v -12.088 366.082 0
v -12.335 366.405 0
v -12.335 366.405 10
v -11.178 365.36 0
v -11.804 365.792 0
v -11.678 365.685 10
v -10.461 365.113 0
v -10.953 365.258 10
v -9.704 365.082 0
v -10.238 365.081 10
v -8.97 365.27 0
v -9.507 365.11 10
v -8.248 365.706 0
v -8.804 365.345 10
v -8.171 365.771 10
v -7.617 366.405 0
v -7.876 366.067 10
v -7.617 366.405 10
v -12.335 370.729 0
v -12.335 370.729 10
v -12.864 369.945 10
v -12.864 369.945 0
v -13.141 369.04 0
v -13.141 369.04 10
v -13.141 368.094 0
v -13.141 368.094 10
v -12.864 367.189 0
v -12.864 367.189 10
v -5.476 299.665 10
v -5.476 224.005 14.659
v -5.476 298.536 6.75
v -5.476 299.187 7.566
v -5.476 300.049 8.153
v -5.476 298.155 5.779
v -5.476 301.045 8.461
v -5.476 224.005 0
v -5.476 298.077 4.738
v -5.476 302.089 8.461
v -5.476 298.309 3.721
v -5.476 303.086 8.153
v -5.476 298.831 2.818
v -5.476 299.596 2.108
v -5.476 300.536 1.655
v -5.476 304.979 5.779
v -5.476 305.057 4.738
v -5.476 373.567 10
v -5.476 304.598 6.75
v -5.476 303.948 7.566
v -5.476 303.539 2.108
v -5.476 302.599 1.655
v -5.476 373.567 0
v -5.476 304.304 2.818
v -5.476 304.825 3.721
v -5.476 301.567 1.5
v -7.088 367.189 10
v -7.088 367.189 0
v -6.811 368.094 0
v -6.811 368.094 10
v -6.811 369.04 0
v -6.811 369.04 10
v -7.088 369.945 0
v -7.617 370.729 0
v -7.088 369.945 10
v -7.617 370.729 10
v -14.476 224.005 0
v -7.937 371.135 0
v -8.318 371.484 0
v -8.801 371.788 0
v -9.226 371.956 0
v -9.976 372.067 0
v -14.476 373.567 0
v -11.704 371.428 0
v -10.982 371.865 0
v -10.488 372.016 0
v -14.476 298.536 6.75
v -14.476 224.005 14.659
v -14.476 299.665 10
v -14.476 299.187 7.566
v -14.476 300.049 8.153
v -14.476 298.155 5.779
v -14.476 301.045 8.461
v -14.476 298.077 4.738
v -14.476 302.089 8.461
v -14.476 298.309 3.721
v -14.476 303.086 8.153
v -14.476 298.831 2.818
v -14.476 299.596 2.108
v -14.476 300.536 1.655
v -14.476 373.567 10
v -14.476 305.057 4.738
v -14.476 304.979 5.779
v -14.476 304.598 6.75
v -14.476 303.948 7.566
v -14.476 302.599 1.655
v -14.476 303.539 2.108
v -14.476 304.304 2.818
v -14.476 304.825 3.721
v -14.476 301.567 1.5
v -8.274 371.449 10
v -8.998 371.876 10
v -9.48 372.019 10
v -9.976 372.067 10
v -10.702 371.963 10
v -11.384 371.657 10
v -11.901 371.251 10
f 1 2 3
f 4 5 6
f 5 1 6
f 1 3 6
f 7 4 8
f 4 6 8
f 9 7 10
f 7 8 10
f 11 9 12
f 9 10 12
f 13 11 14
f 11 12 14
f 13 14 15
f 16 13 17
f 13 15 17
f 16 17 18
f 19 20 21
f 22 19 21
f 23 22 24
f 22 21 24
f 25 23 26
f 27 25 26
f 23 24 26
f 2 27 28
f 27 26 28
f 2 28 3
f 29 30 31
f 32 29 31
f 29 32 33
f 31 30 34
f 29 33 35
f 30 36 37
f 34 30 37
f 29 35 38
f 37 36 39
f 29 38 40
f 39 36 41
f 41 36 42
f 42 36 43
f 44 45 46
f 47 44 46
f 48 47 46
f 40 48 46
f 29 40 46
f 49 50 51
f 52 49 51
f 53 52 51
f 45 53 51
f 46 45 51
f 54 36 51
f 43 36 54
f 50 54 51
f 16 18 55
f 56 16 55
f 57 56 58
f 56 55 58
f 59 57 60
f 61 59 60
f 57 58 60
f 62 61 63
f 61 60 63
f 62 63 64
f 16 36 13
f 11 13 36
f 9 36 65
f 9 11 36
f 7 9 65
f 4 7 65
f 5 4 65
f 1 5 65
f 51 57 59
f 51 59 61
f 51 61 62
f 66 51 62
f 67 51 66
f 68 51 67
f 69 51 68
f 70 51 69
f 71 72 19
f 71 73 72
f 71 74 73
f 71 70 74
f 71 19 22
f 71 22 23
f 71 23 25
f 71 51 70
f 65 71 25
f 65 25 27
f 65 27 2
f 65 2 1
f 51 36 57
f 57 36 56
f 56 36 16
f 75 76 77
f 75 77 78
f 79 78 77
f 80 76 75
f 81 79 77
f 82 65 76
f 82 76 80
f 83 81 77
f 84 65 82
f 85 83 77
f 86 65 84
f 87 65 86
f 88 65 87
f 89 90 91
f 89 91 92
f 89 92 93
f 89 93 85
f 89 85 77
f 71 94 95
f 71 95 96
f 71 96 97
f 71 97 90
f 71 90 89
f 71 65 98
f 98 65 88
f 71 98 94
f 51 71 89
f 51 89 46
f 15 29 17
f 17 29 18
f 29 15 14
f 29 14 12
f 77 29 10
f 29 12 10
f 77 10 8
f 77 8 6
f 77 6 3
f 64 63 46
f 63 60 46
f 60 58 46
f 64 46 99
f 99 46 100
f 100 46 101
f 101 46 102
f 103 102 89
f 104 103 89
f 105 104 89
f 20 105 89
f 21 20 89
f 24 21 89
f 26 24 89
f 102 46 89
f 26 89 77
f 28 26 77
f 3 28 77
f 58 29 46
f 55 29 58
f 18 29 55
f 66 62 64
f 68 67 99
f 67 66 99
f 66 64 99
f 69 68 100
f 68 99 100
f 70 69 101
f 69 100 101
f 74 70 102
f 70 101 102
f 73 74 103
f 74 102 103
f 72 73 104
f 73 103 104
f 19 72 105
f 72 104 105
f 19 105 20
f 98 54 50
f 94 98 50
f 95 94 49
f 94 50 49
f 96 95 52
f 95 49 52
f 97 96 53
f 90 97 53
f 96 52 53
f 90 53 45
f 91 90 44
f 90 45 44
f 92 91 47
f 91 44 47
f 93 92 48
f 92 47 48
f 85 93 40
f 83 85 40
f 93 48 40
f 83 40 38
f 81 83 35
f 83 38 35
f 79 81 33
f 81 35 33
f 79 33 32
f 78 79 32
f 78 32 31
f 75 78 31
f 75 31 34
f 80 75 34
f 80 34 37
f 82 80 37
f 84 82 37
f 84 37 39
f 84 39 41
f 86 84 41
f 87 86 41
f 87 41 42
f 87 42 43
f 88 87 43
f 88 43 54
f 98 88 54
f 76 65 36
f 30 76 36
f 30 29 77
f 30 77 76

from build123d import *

# Parameters (mm, degrees)
BOSS_EXTRU_1_DEPTH      = 10
ESQUISSE3_W             = 9
ESQUISSE3_H             = 75.66
BOSS_EXTRU_2_DEPTH      = 7
ENL_V_MAT_EXTRU_1_DEPTH = 13
ESQUISSE5_RX            = 3.5
ESQUISSE5_RY            = 3
ENL_V_MAT_EXTRU_2_DEPTH = 13
ESQUISSE6_R             = 3.2
ENL_V_MAT_EXTRU_3_DEPTH = 13
ESQUISSE7_R             = 3.5
ENL_V_MAT_EXTRU_4_DEPTH = 13


with BuildPart() as part:
    # Esquisse2 → Boss.-Extru.1 (new body)
    with BuildSketch(Plane.XY):
        Polygon((-14.475776368, 301.567147766), (-14.475776368, 373.567147766), (-5.475776368, 373.567147766), (-5.475776368, 301.567147766), (-5.475776368, 224.004578109), (-14.475776368, 224.004578109), align=None)
    extrude(amount=BOSS_EXTRU_1_DEPTH)

    # Esquisse3 → Boss.-Extru.2 (add)
    with BuildSketch(Plane.XY.offset(10)):
        with Locations((-9.975776368, 261.834578109)):
            Rectangle(ESQUISSE3_W, ESQUISSE3_H)
    extrude(amount=BOSS_EXTRU_2_DEPTH)

    # Esquisse4 → Enlèv. mat.-Extru.1 (cut)
    with BuildSketch(Plane(origin=(-5.475776368, 0, 0), x_dir=(0, 0, -1), z_dir=(1, 0, 0))):
        Polygon((-10, 299.664578109), (-14.659103262, 224.004578109), (-17, 224.004578109), (-17, 299.664578109), align=None)
    extrude(amount=-ENL_V_MAT_EXTRU_1_DEPTH, mode=Mode.SUBTRACT)

    # Esquisse5 → Enlèv. mat.-Extru.2 (cut)
    with BuildSketch(Plane.XY.offset(10)):
        with Locations(Location((-9.975776368, 368.567147766), (0, 0, 90))):
            Ellipse(ESQUISSE5_RX, ESQUISSE5_RY)
    extrude(amount=-ENL_V_MAT_EXTRU_2_DEPTH, mode=Mode.SUBTRACT)

    # Esquisse6 → Enlèv. mat.-Extru.3 (cut)
    with BuildSketch(Plane.XY.offset(10)):
        with Locations((-9.975776368, 368.567147766)):
            Circle(ESQUISSE6_R)
    extrude(amount=-ENL_V_MAT_EXTRU_3_DEPTH, mode=Mode.SUBTRACT)

    # Esquisse7 → Enlèv. mat.-Extru.4 (cut)
    with BuildSketch(Plane(origin=(-5.475776368, 0, 0), x_dir=(0, 0, -1), z_dir=(1, 0, 0))):
        with Locations((-5, 301.567147766)):
            Circle(ESQUISSE7_R)
    extrude(amount=-ENL_V_MAT_EXTRU_4_DEPTH, mode=Mode.SUBTRACT)


solid = part.part
